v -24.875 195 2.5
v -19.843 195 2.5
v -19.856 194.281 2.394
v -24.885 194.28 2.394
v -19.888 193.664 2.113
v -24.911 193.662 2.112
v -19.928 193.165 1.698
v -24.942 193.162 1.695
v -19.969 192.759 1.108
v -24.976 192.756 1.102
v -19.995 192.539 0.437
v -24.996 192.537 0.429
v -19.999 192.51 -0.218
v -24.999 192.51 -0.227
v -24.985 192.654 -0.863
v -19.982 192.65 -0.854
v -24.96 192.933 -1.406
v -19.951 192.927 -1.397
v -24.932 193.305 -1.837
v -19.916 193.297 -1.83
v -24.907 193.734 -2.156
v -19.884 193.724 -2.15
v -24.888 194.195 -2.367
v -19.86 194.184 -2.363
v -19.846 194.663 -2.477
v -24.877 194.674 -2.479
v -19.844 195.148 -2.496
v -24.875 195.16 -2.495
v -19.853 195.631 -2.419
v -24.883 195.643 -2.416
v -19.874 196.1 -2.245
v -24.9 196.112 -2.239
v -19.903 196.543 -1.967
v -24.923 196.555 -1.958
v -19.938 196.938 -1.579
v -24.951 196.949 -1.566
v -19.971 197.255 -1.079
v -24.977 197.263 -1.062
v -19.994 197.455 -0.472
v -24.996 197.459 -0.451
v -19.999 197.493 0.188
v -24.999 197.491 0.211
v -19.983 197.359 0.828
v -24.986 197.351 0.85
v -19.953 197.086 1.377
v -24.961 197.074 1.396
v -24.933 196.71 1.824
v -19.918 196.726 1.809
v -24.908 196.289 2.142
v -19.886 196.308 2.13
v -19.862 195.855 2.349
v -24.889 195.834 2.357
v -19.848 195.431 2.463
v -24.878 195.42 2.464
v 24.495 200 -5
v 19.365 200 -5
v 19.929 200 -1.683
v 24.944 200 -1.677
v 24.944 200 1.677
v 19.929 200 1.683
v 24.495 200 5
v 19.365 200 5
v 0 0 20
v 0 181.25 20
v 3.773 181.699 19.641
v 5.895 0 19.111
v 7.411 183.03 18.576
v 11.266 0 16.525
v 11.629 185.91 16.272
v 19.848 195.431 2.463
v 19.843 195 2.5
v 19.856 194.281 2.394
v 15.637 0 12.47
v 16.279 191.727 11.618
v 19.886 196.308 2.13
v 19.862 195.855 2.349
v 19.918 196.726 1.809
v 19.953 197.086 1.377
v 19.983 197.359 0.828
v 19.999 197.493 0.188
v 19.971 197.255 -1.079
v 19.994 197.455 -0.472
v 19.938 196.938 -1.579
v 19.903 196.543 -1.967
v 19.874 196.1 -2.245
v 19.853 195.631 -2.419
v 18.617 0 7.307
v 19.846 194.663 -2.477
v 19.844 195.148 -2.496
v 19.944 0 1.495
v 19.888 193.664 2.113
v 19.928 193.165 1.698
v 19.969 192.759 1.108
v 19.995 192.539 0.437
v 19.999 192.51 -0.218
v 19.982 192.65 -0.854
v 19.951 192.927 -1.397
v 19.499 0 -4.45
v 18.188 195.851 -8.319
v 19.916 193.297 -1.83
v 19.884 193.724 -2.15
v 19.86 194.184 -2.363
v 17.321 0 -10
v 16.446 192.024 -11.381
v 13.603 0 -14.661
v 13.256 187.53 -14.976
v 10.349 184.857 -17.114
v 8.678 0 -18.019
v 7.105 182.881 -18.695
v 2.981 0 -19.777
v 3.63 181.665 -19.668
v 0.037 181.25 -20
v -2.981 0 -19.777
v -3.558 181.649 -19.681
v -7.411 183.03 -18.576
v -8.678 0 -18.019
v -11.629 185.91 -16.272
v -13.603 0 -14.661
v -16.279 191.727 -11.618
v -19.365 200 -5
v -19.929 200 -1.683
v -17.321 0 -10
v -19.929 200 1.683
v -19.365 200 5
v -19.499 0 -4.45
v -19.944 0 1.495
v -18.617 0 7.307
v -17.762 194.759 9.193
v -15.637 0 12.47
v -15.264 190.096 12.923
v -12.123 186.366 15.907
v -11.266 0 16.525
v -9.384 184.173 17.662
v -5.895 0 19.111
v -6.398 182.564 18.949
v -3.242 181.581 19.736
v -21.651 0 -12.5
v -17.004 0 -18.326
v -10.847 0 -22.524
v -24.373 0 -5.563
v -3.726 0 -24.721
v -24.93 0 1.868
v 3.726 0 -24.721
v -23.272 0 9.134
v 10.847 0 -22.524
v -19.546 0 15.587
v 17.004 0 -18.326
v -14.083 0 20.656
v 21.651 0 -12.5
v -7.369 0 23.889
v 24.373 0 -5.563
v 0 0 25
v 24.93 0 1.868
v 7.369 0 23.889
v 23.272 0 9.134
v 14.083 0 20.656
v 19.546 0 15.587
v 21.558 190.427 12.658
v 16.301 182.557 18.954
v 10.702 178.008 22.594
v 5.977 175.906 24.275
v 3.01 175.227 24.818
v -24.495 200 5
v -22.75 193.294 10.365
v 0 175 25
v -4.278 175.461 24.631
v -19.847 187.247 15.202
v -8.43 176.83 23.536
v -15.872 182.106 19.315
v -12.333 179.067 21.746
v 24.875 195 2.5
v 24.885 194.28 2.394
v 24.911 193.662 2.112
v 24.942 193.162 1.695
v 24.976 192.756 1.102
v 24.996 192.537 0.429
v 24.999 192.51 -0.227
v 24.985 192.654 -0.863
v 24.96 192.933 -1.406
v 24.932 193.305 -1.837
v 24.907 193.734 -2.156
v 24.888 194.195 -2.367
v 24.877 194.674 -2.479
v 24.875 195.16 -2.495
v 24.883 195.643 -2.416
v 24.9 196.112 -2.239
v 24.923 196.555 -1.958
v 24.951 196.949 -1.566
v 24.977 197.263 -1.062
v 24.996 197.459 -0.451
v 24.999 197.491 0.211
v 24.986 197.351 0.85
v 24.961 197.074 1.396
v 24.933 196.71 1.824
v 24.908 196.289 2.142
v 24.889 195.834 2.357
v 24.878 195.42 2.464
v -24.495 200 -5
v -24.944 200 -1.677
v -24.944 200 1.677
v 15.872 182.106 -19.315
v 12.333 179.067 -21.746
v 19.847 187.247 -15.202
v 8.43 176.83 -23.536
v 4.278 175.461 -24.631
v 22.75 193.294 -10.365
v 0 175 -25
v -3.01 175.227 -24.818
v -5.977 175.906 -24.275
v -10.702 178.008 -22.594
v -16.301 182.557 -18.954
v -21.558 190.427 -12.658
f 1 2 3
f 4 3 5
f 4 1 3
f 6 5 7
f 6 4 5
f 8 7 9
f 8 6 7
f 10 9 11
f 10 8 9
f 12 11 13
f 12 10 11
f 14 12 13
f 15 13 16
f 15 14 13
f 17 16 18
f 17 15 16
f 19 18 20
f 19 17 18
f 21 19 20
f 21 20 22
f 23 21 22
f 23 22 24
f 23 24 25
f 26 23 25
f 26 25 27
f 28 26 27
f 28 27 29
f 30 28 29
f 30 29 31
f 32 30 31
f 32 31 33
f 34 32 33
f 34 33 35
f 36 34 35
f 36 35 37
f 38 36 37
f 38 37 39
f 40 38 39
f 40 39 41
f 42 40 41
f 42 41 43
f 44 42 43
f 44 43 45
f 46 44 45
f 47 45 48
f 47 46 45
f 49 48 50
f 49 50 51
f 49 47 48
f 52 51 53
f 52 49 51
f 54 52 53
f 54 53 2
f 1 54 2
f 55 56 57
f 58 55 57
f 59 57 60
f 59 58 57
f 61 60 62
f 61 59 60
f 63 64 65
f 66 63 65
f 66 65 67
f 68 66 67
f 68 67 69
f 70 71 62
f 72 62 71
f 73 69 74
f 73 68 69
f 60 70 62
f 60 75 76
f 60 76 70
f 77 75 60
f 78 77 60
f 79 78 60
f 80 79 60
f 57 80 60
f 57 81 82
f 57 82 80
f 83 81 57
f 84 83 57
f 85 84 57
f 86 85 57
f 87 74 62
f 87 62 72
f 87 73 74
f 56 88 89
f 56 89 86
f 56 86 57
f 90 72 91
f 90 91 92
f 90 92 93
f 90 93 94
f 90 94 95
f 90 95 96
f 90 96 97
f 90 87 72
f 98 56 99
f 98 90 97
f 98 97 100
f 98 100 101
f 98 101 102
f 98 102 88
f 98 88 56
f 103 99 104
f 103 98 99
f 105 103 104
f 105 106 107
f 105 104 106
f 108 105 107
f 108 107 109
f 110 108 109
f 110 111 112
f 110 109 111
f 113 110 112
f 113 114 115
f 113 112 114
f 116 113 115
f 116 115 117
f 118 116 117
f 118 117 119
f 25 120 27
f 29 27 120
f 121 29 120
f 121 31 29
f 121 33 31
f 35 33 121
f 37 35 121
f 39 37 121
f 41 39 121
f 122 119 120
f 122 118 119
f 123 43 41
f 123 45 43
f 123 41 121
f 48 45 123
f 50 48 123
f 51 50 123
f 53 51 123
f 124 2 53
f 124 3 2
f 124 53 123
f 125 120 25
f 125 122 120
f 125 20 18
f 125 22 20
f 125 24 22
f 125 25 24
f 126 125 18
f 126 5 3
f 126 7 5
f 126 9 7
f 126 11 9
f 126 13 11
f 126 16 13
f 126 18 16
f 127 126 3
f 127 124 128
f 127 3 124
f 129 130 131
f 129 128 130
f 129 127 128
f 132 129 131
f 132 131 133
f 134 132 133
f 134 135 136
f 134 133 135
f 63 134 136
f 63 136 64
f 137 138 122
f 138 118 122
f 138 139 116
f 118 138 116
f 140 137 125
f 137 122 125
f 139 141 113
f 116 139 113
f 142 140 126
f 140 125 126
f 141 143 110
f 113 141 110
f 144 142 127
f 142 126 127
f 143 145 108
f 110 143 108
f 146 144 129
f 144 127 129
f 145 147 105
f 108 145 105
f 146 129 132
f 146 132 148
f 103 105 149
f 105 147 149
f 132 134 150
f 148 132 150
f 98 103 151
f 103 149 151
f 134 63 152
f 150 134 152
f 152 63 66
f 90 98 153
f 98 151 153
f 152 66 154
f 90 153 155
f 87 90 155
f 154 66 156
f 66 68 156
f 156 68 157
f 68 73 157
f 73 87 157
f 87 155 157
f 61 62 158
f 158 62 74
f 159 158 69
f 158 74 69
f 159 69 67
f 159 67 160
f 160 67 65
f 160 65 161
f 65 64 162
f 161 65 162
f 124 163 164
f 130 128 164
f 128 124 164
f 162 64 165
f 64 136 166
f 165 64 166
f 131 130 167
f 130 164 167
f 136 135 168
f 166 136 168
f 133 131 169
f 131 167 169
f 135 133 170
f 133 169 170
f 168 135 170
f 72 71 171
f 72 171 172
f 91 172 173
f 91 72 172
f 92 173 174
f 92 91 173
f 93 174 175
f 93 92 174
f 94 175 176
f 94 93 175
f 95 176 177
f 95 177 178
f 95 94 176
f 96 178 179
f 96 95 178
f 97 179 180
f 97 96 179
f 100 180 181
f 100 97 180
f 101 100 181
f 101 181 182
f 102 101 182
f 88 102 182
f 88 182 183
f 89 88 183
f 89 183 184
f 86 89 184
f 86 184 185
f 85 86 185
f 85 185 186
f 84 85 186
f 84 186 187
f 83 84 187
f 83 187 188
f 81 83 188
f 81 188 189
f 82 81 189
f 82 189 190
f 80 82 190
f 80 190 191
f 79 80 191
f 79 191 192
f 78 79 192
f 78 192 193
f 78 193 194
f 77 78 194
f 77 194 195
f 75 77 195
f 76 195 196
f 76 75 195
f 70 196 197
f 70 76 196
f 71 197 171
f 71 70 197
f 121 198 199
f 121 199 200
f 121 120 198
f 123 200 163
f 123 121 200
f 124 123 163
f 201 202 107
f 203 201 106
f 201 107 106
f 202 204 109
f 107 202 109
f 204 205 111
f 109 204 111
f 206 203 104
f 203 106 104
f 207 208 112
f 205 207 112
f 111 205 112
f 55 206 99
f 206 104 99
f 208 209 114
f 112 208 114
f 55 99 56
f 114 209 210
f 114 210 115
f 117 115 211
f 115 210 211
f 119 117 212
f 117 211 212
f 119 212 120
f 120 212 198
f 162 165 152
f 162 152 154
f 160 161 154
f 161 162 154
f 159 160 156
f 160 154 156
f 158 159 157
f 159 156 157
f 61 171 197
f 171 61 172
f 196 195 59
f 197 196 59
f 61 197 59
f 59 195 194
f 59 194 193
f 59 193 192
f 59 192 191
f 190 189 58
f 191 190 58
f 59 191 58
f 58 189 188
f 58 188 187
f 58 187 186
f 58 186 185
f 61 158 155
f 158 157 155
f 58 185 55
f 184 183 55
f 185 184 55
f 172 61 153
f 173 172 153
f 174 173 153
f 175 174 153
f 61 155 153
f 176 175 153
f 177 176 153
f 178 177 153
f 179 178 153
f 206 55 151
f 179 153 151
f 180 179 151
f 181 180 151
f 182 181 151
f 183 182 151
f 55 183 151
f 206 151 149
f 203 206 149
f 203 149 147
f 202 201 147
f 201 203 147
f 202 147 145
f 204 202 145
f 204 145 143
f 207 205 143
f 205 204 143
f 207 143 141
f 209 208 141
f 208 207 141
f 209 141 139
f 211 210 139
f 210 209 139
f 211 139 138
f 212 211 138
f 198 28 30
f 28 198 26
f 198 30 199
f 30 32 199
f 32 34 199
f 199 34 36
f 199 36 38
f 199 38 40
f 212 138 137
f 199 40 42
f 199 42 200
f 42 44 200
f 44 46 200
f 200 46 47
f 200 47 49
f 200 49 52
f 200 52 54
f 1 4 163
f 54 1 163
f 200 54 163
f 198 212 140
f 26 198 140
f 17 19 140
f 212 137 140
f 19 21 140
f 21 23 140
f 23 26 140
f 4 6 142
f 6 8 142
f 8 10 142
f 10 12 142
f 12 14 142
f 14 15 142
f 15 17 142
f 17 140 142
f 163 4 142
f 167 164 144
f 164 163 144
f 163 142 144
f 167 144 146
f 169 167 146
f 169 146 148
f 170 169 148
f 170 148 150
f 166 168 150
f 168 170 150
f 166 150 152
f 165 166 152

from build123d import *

# Parameters (mm, degrees)
SKETCH1_R               = 25
SKETCH1_R_2             = 20
BOSS_EXTRUDE1_DEPTH     = 200
CUT_EXTRUDE1_DEPTH      = 200
CUT_EXTRUDE1_DEPTH_BACK = 200
SKETCH2_R               = 2.5


with BuildPart() as part:
    # Sketch1 → Boss-Extrude1 (new body)
    with BuildSketch(Plane(origin=(0, 0, 0), x_dir=(1, 0, 0), z_dir=(0, 1, 0))):
        with Locations(Location((0, 0, 0), (0, 0, 270))):
            Circle(SKETCH1_R)
        with Locations(Location((0, 0, 0), (0, 0, 270))):
            Circle(SKETCH1_R_2, mode=Mode.SUBTRACT)
    extrude(amount=BOSS_EXTRUDE1_DEPTH)

    # Sketch2 → Cut-Extrude1 (cut, two sides: drawn at the far end of the back side and taken through both)
    with BuildSketch(Plane(origin=(0, 0, 0), x_dir=(0, 0, -1), z_dir=(1, 0, 0)).offset(-CUT_EXTRUDE1_DEPTH_BACK)):
        with Locations(Location((0, 195, 0), (0, 0, 180))):
            Circle(SKETCH2_R)
        Polygon((25, 175), (5, 200), (-5, 200), (-25, 175), (-25, 205.937261936), (25, 205.937261936), align=None)
    extrude(amount=CUT_EXTRUDE1_DEPTH + CUT_EXTRUDE1_DEPTH_BACK, mode=Mode.SUBTRACT)


solid = part.part
